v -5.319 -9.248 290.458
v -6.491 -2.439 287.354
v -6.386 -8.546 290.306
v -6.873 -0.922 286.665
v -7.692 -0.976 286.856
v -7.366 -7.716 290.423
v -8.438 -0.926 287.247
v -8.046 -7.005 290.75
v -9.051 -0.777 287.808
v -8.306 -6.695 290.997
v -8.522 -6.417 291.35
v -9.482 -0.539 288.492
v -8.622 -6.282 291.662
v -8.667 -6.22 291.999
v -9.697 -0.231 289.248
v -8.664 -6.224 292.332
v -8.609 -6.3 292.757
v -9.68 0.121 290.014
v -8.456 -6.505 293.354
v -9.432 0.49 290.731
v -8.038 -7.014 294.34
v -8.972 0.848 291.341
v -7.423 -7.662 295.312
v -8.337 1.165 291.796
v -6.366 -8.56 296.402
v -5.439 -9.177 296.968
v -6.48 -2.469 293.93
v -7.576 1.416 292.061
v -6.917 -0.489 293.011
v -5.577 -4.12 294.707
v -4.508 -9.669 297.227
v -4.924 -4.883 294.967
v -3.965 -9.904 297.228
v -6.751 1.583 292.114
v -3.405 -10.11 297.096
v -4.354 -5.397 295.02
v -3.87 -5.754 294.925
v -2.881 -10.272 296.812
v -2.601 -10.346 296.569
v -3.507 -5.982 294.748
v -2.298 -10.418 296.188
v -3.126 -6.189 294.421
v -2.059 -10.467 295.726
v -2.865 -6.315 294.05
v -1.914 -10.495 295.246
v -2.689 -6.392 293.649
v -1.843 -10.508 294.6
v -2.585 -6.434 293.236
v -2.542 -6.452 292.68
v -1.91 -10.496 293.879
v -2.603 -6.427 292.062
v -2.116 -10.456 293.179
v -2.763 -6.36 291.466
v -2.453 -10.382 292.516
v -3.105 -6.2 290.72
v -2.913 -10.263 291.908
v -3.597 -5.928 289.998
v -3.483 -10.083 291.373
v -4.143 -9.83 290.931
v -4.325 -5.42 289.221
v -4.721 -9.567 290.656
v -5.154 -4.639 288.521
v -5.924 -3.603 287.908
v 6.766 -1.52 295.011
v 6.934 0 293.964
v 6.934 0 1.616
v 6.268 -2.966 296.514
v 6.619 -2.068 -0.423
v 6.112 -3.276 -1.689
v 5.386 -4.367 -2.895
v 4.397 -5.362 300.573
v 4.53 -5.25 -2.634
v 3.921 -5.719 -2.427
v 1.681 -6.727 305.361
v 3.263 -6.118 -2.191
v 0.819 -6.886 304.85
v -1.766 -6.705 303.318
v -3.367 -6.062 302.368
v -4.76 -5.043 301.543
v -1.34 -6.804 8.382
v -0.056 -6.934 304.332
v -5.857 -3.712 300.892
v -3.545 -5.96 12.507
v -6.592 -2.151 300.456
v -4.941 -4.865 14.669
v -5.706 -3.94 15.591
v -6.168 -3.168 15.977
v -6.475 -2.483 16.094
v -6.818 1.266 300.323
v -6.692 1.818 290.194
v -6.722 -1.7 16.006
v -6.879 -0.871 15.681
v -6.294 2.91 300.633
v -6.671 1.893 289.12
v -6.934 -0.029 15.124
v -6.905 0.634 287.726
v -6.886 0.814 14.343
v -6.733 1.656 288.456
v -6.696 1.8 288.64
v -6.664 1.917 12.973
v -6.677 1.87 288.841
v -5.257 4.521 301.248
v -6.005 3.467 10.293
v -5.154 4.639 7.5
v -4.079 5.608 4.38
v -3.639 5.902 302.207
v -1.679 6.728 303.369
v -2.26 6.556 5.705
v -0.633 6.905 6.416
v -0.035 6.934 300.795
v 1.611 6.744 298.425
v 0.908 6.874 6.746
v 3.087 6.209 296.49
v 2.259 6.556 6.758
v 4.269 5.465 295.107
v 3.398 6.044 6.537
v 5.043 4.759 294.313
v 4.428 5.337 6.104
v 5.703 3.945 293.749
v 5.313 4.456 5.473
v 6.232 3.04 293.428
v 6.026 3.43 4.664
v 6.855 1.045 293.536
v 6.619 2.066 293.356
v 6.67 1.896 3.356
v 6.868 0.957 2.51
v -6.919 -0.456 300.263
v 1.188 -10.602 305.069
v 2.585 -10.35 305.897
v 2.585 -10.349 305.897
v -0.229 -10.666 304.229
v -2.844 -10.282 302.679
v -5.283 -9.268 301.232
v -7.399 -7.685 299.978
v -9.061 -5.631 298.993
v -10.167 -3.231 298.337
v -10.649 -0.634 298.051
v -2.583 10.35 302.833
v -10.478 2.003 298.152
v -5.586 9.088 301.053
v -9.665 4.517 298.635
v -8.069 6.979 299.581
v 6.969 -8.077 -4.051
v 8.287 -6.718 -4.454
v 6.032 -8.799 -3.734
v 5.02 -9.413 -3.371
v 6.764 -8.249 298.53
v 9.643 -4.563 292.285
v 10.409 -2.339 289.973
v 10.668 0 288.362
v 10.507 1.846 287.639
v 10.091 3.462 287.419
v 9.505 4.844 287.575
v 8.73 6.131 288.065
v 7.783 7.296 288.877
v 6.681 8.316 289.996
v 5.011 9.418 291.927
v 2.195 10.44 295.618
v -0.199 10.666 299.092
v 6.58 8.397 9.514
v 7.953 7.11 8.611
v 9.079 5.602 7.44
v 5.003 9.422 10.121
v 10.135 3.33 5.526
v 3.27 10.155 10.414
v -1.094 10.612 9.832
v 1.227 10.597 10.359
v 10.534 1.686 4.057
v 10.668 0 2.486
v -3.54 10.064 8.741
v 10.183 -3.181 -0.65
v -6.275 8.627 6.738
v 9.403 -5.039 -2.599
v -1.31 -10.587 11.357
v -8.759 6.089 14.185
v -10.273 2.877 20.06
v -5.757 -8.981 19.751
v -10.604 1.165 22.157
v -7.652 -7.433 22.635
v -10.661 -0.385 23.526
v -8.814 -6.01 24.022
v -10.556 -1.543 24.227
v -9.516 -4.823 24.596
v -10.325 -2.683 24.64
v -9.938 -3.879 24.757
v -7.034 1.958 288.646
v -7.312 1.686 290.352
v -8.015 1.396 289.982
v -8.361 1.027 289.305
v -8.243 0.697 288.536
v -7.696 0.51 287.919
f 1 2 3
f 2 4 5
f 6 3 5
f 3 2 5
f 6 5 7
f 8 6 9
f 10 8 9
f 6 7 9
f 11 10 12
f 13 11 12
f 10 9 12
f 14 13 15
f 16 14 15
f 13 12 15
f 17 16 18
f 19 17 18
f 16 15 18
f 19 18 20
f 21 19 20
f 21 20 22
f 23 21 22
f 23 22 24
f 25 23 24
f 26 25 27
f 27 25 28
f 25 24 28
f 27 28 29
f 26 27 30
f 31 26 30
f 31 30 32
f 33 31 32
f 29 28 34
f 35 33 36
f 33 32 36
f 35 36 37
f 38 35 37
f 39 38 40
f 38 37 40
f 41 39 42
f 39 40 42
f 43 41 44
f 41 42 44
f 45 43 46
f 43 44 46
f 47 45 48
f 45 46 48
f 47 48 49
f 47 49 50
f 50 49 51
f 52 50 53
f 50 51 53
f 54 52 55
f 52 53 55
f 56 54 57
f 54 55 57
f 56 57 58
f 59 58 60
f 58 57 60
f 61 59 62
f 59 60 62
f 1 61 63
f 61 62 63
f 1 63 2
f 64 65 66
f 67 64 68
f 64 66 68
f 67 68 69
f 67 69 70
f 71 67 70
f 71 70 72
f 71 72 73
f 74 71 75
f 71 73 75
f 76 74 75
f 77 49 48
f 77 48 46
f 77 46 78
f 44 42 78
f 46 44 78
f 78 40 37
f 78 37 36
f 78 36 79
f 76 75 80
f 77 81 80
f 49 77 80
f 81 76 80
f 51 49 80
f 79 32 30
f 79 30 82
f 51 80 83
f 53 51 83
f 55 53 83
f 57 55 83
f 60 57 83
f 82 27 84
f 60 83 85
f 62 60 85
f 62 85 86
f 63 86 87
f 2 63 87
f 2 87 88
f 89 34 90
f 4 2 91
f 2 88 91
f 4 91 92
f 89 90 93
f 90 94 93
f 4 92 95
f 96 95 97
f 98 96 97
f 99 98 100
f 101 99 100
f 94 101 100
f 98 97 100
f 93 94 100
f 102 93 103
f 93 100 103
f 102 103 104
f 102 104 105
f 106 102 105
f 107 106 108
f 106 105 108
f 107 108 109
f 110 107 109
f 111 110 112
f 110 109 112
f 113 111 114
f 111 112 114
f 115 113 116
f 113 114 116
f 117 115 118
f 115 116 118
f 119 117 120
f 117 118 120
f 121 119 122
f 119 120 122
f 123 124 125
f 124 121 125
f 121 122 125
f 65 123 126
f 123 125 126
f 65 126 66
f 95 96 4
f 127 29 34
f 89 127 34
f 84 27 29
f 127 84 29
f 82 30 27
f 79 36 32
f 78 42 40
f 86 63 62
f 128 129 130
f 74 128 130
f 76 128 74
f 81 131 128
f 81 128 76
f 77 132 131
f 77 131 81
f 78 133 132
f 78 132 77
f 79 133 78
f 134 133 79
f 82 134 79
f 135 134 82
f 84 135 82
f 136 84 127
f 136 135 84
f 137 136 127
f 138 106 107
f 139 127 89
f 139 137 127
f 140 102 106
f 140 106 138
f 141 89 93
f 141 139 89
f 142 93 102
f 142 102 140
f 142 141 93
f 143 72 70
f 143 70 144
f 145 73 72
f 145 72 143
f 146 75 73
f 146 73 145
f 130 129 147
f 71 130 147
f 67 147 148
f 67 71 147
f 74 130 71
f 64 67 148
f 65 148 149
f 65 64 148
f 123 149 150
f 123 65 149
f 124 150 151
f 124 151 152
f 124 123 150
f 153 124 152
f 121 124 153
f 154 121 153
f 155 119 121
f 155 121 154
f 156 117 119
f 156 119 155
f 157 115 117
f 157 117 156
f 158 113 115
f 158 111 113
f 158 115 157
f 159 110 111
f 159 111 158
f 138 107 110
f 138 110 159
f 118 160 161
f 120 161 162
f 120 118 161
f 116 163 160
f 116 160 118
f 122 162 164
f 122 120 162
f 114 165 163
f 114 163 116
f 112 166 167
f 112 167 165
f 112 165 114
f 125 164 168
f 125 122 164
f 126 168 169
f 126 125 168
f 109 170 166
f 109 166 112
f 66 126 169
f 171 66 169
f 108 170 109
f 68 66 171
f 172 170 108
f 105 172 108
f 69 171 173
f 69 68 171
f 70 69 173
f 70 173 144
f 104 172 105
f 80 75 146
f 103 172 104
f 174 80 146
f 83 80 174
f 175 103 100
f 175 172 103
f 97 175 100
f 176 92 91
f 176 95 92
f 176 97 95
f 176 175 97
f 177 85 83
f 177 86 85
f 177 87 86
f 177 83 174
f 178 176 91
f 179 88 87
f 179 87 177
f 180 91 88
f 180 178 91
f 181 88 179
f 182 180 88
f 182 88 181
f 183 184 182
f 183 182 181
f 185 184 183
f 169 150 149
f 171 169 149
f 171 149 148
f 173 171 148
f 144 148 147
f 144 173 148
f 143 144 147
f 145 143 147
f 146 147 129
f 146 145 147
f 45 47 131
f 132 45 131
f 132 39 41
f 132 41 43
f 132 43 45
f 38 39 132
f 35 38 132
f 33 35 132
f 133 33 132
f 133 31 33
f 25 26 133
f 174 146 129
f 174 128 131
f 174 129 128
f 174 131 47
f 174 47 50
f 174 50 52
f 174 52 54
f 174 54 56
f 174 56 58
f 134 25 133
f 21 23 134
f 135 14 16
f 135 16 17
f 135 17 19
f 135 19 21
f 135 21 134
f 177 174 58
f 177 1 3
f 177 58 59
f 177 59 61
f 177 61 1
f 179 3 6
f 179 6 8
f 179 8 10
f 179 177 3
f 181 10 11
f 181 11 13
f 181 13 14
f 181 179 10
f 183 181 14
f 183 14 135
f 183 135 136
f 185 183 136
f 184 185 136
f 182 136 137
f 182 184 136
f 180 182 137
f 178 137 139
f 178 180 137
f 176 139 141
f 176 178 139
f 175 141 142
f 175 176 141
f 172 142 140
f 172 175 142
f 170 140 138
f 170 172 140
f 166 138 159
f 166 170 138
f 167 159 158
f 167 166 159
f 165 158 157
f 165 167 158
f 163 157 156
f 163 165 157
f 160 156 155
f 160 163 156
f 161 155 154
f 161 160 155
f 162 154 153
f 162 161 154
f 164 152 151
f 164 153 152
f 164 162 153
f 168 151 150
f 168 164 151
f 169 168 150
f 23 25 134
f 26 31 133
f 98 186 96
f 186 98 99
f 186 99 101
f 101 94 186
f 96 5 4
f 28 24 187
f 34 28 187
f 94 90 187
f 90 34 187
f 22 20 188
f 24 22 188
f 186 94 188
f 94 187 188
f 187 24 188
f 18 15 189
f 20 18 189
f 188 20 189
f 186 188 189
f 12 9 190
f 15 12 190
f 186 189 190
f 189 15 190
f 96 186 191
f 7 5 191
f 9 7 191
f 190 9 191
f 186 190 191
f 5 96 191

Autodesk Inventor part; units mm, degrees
ref_plane "Start Plane" through (0, 0, -4.4541) normal (0, 0, 1) x (1, 0, 0)
ref_plane "End Plane" through (0, 0, 305.8974) normal (0, 0, 1) x (1, 0, 0)
sketch "Sketch" plane through (0, 0, 0) normal (0, 0, 1) x (1, 0, 0)
  circle A0 centre (0, 0) radius 6.9342
  circle A1 centre (0, 0) radius 10.668
  dimension "d0" = 21.336
  dimension "d1" = 3.7338
extrude "Body" add sketch "Sketch" along normal up to surface (310.3515 mm away) from surface at -4.4541
sketch "Sketch3" plane through (0, 0, 0) normal (0, 0, 1) x (1, 0, 0)
  line L0 (0, 0) -> (10, 0)
ref_plane "Work Plane3" through (0, 0, 0) normal (0, -1, 0) x (1, 0, 0)
sketch "Sketch4" plane through (0, 0, 0) normal (0, -1, 0) x (1, 0, 0)
  line L0 (-2, -4.4541) -> (12, -4.4541)
  line L1 (-2, 305.8974) -> (12, 305.8974)
  dimension "d7" = 310.3515
ref_plane "Work Plane4" through (10.249, -2.9606, -4.8357) normal (-0.3966, 0.1146, -0.9108) x (-0.7636, 0.5095, 0.3966)
split "Split1" plane through (10.249, -2.9606, -4.8357) removes the side toward (-0.3966, 0.1146, -0.9108)
ref_plane "Work Plane5" through (10.0091, 3.6912, -24.7602) normal (-0.8617, -0.3178, -0.3957) x (-0.2286, -0.4531, 0.8617)
split "Split2" plane through (10.0091, 3.6912, -24.7602) removes the side toward (-0.8617, -0.3178, -0.3957)
ref_plane "Work Plane6" through (-2.5393, -10.3614, -10.4394) normal (0.1665, 0.6793, -0.7147) x (0.9028, -0.3964, -0.1665)
split "Split3" plane through (-2.5393, -10.3614, -10.4394) removes the side toward (0.1665, 0.6793, -0.7147)
ref_plane "Work Plane7" through (-10.0742, -3.5095, 321.3152) normal (0.7992, 0.2784, 0.5327) x (0.5832, -0.1452, -0.7992)
split "Split4" plane through (-10.0742, -3.5095, 321.3152) removes the side toward (0.7992, 0.2784, 0.5327)
ref_plane "Work Plane8" through (10.668, 0, 310.6897) normal (-0.51, 0, 0.8602) x (0.8602, 0, 0.51)
split "Split5" plane through (10.668, 0, 310.6897) removes the side toward (-0.51, 0, 0.8602)
ref_plane "Work Plane9" through (-36.1517, -17.3472, 323.6752) normal (0.1548, -0.8989, 0.4098) x (0.8658, -0.0763, -0.4945)
sketch "Sketch5" plane through (-36.1517, -17.3472, 323.6752) normal (0.1548, -0.8989, 0.4098) x (0.8658, -0.0763, -0.4945)
  circle A0 centre (41.0585, -4.6699) radius 3 projected
  point P0 (190.0204, -223.4181)
hole "Hole1" at (-2.823, -22.4951, 299.7942) direction (-0.1548, 0.8989, -0.4098) diameter 6 depth 25.4 tip angle 118
equation "\"d0\" = G_H"
equation "\"d1\" = G_T"
equation "\"d2\" = G_L"
equation "\"G_H\" = 21.336"
equation "\"G_T\" = 3.7338"
equation "\"G_L\" = 310.3515"
equation "\"G_OFFSET_START\" = 4.45413"
equation "\"G_OFFSET_END\" = 1.53222"
equation "\"d4\" = -G_OFFSET_START"
equation "\"d5\" = G_OFFSET_END + B_L"
equation "\"B_L\" = 304.36515"
properties part number "ANSI - 1/2 x 0.147 - 12.219" material "Steel, Mild"
